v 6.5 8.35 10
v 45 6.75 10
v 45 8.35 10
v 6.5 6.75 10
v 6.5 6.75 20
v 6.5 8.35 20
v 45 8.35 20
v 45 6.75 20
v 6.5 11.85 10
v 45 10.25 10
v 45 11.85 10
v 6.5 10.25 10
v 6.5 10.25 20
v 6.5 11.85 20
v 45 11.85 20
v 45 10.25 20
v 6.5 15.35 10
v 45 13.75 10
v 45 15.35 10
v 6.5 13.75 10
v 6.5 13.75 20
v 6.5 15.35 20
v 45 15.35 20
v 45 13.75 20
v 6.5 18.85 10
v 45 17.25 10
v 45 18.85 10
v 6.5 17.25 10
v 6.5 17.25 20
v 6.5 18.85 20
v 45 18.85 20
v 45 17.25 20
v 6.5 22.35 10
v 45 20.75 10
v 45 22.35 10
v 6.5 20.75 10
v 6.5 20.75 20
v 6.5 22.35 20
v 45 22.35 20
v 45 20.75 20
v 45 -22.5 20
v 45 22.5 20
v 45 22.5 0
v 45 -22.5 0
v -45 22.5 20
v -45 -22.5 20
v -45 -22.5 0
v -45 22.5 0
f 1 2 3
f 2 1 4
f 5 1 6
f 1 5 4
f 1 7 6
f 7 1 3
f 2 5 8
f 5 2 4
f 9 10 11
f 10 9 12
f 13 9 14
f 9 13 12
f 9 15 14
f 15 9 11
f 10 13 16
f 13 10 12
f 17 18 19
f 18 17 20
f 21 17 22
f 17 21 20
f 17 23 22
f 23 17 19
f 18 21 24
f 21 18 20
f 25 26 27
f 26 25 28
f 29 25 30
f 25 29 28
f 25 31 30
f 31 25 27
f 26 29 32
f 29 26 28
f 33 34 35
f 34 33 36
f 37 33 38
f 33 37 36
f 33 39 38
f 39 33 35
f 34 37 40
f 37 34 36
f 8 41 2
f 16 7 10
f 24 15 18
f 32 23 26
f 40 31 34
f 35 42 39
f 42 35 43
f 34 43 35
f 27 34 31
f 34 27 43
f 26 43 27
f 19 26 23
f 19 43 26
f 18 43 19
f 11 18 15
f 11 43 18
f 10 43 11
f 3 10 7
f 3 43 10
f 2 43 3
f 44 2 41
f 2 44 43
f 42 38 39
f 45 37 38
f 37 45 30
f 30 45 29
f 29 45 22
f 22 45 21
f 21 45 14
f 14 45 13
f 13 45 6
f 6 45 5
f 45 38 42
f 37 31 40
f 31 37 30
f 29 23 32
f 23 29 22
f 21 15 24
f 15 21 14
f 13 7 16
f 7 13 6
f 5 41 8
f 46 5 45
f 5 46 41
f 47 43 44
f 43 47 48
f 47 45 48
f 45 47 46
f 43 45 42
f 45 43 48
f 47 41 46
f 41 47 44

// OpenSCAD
// Microscope Slide Drying Rack
// Designed for 10 slides (75x25x1mm) standing on long edge

// --- Dimensions ---
block_length = 90.0;      // X dimension of the base block
block_width = 45.0;       // Y dimension of the base block
block_height = 20.0;      // Z dimension of the base block

slot_length = 77.0;       // X dimension of the slots
slot_width = 1.6;         // Y dimension of the slots
slot_depth = 10.0;        // Z depth of the slots

slot_spacing = 3.5;       // Y center-to-center distance between slots
num_slots = 10;           // Number of slots

// --- Resolution ---
$fn = 64;

// --- Implementation ---

// The part is built such that it rests on the XY plane at Z = 0.
// The block is centered on X and Y.

difference() {
    // Main block body
    // Centered on X and Y, bottom face at Z = 0
    translate([-block_length/2, -block_width/2, 0])
        cube([block_length, block_width, block_height]);

    // Create the slots
    // 1. Calculate the total span of the centers of the slots
    //    The distance from the center of the first slot to the center of the last is (num_slots - 1) * slot_spacing
    // 2. To center the group of slots in Y:
    //    The center of the group is at block_width / 2.
    //    The first slot center is at (block_width / 2) - ((num_slots - 1) * slot_spacing / 2)
    // 3. To center the group of slots in X:
    //    The center of the group is at block_length / 2.
    //    The first slot center is at (block_length / 2) - (slot_length / 2)
    
    let(
        total_span_y = (num_slots - 1) * slot_spacing,
        // We calculate the starting position of the first slot's bounding box
        // to ensure the group is centered.
        start_x = (block_length - slot_length) / 2,
        start_y = (block_width - total_span_y) / 2,
        // The slots are cut from the top face (Z = block_height) downwards.
        // To ensure a clean cut through the top face, we start at block_height - slot_depth
        // and extend slightly above the block (Rule 5).
        start_z = block_height - slot_depth
    )
    translate([start_x, start_y, start_z]) {
        for (i = [0 : num_slots - 1]) {
            translate([0, i * slot_spacing, 0]) {
                // We use a slightly larger dimension for the cutting cube 
                // to ensure it cuts through the top face and the sides (Rule 5).
                // X: slot_length + 2 to ensure it clears the X-edges
                // Y: slot_width (the loop handles the spacing)
                // Z: slot_depth + 1 to ensure it clears the top face
                cube([slot_length + 2, slot_width, slot_depth + 1]);
            }
        }
    }
}

// Verification of requirements:
// - Block: 90 x 45 x 20.
// - Slots: 77 x 1.6 x 10.
// - Slot spacing: 3.5 center-to-center.
// - Centered in X and Y.
// - Rests on XY plane at Z=0.
